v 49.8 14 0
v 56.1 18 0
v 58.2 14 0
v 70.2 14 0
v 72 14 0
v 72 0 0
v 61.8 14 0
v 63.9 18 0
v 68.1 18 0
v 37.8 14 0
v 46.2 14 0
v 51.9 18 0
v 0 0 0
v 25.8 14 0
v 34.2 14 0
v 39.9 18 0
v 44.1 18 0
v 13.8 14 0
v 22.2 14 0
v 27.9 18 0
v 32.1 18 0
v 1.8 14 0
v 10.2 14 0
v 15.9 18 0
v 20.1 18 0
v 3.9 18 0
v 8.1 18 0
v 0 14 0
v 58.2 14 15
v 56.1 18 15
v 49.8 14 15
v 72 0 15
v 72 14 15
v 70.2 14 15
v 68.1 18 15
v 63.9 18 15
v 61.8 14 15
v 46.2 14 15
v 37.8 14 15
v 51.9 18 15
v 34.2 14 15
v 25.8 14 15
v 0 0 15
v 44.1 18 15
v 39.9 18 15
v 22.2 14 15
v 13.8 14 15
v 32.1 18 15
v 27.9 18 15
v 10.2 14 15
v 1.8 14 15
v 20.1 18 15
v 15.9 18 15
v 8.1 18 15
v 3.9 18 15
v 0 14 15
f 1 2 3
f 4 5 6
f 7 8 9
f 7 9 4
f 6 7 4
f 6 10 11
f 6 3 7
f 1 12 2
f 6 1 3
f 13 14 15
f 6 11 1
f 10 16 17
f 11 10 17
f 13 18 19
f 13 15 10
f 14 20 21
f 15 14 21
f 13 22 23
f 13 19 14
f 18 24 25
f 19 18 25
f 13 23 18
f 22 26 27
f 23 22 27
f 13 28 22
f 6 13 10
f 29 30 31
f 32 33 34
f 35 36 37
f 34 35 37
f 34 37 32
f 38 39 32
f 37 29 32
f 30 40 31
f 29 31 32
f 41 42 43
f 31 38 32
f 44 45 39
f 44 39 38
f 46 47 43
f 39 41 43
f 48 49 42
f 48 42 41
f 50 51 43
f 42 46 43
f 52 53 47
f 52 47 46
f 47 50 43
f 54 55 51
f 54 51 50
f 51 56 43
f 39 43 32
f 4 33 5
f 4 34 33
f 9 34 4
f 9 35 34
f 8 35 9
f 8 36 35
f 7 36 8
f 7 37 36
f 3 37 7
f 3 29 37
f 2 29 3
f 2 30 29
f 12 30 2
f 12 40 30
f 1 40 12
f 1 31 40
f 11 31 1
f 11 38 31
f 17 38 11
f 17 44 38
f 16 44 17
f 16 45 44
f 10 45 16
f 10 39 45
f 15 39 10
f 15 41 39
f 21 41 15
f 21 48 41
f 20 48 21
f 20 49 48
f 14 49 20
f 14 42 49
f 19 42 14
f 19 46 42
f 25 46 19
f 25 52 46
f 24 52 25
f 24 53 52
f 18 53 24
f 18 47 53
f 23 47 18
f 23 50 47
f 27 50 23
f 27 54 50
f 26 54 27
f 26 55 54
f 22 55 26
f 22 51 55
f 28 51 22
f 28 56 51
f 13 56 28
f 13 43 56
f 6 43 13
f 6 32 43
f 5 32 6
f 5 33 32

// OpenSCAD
$fn = 32;

// ----------------------------------------------------------------------
// Gear rack: 6 teeth, pitch 12 mm
// ----------------------------------------------------------------------

// --- parameters (mm) ---
teeth = 6;                // number of teeth
pitch = 12;               // tooth pitch, X
root_w = 8.4;             // tooth width at the root
tip_w = 4.2;              // tooth width at the tip
base_h = 14;              // rack body height, Y
tooth_h = 4;              // tooth height above the body
plate_t = 15;             // rack width, Z (extrusion height)

rack_l = teeth * pitch;  // overall length
total_h = base_h + tooth_h;  // overall height

profile = [[0, 0], [72, 0], [72, 14], [70.2, 14], [68.1, 18], [63.9, 18], [61.8, 14], [58.2, 14], [56.1, 18], [51.9, 18], [49.8, 14], [46.2, 14], [44.1, 18], [39.9, 18], [37.8, 14], [34.2, 14], [32.1, 18], [27.9, 18], [25.8, 14], [22.2, 14], [20.1, 18], [15.9, 18], [13.8, 14], [10.2, 14], [8.1, 18], [3.9, 18], [1.8, 14], [0, 14]];  // primary outline, 28 points, counter clockwise

// --- the one profile operation ---
linear_extrude(height = plate_t) polygon(points = profile);
